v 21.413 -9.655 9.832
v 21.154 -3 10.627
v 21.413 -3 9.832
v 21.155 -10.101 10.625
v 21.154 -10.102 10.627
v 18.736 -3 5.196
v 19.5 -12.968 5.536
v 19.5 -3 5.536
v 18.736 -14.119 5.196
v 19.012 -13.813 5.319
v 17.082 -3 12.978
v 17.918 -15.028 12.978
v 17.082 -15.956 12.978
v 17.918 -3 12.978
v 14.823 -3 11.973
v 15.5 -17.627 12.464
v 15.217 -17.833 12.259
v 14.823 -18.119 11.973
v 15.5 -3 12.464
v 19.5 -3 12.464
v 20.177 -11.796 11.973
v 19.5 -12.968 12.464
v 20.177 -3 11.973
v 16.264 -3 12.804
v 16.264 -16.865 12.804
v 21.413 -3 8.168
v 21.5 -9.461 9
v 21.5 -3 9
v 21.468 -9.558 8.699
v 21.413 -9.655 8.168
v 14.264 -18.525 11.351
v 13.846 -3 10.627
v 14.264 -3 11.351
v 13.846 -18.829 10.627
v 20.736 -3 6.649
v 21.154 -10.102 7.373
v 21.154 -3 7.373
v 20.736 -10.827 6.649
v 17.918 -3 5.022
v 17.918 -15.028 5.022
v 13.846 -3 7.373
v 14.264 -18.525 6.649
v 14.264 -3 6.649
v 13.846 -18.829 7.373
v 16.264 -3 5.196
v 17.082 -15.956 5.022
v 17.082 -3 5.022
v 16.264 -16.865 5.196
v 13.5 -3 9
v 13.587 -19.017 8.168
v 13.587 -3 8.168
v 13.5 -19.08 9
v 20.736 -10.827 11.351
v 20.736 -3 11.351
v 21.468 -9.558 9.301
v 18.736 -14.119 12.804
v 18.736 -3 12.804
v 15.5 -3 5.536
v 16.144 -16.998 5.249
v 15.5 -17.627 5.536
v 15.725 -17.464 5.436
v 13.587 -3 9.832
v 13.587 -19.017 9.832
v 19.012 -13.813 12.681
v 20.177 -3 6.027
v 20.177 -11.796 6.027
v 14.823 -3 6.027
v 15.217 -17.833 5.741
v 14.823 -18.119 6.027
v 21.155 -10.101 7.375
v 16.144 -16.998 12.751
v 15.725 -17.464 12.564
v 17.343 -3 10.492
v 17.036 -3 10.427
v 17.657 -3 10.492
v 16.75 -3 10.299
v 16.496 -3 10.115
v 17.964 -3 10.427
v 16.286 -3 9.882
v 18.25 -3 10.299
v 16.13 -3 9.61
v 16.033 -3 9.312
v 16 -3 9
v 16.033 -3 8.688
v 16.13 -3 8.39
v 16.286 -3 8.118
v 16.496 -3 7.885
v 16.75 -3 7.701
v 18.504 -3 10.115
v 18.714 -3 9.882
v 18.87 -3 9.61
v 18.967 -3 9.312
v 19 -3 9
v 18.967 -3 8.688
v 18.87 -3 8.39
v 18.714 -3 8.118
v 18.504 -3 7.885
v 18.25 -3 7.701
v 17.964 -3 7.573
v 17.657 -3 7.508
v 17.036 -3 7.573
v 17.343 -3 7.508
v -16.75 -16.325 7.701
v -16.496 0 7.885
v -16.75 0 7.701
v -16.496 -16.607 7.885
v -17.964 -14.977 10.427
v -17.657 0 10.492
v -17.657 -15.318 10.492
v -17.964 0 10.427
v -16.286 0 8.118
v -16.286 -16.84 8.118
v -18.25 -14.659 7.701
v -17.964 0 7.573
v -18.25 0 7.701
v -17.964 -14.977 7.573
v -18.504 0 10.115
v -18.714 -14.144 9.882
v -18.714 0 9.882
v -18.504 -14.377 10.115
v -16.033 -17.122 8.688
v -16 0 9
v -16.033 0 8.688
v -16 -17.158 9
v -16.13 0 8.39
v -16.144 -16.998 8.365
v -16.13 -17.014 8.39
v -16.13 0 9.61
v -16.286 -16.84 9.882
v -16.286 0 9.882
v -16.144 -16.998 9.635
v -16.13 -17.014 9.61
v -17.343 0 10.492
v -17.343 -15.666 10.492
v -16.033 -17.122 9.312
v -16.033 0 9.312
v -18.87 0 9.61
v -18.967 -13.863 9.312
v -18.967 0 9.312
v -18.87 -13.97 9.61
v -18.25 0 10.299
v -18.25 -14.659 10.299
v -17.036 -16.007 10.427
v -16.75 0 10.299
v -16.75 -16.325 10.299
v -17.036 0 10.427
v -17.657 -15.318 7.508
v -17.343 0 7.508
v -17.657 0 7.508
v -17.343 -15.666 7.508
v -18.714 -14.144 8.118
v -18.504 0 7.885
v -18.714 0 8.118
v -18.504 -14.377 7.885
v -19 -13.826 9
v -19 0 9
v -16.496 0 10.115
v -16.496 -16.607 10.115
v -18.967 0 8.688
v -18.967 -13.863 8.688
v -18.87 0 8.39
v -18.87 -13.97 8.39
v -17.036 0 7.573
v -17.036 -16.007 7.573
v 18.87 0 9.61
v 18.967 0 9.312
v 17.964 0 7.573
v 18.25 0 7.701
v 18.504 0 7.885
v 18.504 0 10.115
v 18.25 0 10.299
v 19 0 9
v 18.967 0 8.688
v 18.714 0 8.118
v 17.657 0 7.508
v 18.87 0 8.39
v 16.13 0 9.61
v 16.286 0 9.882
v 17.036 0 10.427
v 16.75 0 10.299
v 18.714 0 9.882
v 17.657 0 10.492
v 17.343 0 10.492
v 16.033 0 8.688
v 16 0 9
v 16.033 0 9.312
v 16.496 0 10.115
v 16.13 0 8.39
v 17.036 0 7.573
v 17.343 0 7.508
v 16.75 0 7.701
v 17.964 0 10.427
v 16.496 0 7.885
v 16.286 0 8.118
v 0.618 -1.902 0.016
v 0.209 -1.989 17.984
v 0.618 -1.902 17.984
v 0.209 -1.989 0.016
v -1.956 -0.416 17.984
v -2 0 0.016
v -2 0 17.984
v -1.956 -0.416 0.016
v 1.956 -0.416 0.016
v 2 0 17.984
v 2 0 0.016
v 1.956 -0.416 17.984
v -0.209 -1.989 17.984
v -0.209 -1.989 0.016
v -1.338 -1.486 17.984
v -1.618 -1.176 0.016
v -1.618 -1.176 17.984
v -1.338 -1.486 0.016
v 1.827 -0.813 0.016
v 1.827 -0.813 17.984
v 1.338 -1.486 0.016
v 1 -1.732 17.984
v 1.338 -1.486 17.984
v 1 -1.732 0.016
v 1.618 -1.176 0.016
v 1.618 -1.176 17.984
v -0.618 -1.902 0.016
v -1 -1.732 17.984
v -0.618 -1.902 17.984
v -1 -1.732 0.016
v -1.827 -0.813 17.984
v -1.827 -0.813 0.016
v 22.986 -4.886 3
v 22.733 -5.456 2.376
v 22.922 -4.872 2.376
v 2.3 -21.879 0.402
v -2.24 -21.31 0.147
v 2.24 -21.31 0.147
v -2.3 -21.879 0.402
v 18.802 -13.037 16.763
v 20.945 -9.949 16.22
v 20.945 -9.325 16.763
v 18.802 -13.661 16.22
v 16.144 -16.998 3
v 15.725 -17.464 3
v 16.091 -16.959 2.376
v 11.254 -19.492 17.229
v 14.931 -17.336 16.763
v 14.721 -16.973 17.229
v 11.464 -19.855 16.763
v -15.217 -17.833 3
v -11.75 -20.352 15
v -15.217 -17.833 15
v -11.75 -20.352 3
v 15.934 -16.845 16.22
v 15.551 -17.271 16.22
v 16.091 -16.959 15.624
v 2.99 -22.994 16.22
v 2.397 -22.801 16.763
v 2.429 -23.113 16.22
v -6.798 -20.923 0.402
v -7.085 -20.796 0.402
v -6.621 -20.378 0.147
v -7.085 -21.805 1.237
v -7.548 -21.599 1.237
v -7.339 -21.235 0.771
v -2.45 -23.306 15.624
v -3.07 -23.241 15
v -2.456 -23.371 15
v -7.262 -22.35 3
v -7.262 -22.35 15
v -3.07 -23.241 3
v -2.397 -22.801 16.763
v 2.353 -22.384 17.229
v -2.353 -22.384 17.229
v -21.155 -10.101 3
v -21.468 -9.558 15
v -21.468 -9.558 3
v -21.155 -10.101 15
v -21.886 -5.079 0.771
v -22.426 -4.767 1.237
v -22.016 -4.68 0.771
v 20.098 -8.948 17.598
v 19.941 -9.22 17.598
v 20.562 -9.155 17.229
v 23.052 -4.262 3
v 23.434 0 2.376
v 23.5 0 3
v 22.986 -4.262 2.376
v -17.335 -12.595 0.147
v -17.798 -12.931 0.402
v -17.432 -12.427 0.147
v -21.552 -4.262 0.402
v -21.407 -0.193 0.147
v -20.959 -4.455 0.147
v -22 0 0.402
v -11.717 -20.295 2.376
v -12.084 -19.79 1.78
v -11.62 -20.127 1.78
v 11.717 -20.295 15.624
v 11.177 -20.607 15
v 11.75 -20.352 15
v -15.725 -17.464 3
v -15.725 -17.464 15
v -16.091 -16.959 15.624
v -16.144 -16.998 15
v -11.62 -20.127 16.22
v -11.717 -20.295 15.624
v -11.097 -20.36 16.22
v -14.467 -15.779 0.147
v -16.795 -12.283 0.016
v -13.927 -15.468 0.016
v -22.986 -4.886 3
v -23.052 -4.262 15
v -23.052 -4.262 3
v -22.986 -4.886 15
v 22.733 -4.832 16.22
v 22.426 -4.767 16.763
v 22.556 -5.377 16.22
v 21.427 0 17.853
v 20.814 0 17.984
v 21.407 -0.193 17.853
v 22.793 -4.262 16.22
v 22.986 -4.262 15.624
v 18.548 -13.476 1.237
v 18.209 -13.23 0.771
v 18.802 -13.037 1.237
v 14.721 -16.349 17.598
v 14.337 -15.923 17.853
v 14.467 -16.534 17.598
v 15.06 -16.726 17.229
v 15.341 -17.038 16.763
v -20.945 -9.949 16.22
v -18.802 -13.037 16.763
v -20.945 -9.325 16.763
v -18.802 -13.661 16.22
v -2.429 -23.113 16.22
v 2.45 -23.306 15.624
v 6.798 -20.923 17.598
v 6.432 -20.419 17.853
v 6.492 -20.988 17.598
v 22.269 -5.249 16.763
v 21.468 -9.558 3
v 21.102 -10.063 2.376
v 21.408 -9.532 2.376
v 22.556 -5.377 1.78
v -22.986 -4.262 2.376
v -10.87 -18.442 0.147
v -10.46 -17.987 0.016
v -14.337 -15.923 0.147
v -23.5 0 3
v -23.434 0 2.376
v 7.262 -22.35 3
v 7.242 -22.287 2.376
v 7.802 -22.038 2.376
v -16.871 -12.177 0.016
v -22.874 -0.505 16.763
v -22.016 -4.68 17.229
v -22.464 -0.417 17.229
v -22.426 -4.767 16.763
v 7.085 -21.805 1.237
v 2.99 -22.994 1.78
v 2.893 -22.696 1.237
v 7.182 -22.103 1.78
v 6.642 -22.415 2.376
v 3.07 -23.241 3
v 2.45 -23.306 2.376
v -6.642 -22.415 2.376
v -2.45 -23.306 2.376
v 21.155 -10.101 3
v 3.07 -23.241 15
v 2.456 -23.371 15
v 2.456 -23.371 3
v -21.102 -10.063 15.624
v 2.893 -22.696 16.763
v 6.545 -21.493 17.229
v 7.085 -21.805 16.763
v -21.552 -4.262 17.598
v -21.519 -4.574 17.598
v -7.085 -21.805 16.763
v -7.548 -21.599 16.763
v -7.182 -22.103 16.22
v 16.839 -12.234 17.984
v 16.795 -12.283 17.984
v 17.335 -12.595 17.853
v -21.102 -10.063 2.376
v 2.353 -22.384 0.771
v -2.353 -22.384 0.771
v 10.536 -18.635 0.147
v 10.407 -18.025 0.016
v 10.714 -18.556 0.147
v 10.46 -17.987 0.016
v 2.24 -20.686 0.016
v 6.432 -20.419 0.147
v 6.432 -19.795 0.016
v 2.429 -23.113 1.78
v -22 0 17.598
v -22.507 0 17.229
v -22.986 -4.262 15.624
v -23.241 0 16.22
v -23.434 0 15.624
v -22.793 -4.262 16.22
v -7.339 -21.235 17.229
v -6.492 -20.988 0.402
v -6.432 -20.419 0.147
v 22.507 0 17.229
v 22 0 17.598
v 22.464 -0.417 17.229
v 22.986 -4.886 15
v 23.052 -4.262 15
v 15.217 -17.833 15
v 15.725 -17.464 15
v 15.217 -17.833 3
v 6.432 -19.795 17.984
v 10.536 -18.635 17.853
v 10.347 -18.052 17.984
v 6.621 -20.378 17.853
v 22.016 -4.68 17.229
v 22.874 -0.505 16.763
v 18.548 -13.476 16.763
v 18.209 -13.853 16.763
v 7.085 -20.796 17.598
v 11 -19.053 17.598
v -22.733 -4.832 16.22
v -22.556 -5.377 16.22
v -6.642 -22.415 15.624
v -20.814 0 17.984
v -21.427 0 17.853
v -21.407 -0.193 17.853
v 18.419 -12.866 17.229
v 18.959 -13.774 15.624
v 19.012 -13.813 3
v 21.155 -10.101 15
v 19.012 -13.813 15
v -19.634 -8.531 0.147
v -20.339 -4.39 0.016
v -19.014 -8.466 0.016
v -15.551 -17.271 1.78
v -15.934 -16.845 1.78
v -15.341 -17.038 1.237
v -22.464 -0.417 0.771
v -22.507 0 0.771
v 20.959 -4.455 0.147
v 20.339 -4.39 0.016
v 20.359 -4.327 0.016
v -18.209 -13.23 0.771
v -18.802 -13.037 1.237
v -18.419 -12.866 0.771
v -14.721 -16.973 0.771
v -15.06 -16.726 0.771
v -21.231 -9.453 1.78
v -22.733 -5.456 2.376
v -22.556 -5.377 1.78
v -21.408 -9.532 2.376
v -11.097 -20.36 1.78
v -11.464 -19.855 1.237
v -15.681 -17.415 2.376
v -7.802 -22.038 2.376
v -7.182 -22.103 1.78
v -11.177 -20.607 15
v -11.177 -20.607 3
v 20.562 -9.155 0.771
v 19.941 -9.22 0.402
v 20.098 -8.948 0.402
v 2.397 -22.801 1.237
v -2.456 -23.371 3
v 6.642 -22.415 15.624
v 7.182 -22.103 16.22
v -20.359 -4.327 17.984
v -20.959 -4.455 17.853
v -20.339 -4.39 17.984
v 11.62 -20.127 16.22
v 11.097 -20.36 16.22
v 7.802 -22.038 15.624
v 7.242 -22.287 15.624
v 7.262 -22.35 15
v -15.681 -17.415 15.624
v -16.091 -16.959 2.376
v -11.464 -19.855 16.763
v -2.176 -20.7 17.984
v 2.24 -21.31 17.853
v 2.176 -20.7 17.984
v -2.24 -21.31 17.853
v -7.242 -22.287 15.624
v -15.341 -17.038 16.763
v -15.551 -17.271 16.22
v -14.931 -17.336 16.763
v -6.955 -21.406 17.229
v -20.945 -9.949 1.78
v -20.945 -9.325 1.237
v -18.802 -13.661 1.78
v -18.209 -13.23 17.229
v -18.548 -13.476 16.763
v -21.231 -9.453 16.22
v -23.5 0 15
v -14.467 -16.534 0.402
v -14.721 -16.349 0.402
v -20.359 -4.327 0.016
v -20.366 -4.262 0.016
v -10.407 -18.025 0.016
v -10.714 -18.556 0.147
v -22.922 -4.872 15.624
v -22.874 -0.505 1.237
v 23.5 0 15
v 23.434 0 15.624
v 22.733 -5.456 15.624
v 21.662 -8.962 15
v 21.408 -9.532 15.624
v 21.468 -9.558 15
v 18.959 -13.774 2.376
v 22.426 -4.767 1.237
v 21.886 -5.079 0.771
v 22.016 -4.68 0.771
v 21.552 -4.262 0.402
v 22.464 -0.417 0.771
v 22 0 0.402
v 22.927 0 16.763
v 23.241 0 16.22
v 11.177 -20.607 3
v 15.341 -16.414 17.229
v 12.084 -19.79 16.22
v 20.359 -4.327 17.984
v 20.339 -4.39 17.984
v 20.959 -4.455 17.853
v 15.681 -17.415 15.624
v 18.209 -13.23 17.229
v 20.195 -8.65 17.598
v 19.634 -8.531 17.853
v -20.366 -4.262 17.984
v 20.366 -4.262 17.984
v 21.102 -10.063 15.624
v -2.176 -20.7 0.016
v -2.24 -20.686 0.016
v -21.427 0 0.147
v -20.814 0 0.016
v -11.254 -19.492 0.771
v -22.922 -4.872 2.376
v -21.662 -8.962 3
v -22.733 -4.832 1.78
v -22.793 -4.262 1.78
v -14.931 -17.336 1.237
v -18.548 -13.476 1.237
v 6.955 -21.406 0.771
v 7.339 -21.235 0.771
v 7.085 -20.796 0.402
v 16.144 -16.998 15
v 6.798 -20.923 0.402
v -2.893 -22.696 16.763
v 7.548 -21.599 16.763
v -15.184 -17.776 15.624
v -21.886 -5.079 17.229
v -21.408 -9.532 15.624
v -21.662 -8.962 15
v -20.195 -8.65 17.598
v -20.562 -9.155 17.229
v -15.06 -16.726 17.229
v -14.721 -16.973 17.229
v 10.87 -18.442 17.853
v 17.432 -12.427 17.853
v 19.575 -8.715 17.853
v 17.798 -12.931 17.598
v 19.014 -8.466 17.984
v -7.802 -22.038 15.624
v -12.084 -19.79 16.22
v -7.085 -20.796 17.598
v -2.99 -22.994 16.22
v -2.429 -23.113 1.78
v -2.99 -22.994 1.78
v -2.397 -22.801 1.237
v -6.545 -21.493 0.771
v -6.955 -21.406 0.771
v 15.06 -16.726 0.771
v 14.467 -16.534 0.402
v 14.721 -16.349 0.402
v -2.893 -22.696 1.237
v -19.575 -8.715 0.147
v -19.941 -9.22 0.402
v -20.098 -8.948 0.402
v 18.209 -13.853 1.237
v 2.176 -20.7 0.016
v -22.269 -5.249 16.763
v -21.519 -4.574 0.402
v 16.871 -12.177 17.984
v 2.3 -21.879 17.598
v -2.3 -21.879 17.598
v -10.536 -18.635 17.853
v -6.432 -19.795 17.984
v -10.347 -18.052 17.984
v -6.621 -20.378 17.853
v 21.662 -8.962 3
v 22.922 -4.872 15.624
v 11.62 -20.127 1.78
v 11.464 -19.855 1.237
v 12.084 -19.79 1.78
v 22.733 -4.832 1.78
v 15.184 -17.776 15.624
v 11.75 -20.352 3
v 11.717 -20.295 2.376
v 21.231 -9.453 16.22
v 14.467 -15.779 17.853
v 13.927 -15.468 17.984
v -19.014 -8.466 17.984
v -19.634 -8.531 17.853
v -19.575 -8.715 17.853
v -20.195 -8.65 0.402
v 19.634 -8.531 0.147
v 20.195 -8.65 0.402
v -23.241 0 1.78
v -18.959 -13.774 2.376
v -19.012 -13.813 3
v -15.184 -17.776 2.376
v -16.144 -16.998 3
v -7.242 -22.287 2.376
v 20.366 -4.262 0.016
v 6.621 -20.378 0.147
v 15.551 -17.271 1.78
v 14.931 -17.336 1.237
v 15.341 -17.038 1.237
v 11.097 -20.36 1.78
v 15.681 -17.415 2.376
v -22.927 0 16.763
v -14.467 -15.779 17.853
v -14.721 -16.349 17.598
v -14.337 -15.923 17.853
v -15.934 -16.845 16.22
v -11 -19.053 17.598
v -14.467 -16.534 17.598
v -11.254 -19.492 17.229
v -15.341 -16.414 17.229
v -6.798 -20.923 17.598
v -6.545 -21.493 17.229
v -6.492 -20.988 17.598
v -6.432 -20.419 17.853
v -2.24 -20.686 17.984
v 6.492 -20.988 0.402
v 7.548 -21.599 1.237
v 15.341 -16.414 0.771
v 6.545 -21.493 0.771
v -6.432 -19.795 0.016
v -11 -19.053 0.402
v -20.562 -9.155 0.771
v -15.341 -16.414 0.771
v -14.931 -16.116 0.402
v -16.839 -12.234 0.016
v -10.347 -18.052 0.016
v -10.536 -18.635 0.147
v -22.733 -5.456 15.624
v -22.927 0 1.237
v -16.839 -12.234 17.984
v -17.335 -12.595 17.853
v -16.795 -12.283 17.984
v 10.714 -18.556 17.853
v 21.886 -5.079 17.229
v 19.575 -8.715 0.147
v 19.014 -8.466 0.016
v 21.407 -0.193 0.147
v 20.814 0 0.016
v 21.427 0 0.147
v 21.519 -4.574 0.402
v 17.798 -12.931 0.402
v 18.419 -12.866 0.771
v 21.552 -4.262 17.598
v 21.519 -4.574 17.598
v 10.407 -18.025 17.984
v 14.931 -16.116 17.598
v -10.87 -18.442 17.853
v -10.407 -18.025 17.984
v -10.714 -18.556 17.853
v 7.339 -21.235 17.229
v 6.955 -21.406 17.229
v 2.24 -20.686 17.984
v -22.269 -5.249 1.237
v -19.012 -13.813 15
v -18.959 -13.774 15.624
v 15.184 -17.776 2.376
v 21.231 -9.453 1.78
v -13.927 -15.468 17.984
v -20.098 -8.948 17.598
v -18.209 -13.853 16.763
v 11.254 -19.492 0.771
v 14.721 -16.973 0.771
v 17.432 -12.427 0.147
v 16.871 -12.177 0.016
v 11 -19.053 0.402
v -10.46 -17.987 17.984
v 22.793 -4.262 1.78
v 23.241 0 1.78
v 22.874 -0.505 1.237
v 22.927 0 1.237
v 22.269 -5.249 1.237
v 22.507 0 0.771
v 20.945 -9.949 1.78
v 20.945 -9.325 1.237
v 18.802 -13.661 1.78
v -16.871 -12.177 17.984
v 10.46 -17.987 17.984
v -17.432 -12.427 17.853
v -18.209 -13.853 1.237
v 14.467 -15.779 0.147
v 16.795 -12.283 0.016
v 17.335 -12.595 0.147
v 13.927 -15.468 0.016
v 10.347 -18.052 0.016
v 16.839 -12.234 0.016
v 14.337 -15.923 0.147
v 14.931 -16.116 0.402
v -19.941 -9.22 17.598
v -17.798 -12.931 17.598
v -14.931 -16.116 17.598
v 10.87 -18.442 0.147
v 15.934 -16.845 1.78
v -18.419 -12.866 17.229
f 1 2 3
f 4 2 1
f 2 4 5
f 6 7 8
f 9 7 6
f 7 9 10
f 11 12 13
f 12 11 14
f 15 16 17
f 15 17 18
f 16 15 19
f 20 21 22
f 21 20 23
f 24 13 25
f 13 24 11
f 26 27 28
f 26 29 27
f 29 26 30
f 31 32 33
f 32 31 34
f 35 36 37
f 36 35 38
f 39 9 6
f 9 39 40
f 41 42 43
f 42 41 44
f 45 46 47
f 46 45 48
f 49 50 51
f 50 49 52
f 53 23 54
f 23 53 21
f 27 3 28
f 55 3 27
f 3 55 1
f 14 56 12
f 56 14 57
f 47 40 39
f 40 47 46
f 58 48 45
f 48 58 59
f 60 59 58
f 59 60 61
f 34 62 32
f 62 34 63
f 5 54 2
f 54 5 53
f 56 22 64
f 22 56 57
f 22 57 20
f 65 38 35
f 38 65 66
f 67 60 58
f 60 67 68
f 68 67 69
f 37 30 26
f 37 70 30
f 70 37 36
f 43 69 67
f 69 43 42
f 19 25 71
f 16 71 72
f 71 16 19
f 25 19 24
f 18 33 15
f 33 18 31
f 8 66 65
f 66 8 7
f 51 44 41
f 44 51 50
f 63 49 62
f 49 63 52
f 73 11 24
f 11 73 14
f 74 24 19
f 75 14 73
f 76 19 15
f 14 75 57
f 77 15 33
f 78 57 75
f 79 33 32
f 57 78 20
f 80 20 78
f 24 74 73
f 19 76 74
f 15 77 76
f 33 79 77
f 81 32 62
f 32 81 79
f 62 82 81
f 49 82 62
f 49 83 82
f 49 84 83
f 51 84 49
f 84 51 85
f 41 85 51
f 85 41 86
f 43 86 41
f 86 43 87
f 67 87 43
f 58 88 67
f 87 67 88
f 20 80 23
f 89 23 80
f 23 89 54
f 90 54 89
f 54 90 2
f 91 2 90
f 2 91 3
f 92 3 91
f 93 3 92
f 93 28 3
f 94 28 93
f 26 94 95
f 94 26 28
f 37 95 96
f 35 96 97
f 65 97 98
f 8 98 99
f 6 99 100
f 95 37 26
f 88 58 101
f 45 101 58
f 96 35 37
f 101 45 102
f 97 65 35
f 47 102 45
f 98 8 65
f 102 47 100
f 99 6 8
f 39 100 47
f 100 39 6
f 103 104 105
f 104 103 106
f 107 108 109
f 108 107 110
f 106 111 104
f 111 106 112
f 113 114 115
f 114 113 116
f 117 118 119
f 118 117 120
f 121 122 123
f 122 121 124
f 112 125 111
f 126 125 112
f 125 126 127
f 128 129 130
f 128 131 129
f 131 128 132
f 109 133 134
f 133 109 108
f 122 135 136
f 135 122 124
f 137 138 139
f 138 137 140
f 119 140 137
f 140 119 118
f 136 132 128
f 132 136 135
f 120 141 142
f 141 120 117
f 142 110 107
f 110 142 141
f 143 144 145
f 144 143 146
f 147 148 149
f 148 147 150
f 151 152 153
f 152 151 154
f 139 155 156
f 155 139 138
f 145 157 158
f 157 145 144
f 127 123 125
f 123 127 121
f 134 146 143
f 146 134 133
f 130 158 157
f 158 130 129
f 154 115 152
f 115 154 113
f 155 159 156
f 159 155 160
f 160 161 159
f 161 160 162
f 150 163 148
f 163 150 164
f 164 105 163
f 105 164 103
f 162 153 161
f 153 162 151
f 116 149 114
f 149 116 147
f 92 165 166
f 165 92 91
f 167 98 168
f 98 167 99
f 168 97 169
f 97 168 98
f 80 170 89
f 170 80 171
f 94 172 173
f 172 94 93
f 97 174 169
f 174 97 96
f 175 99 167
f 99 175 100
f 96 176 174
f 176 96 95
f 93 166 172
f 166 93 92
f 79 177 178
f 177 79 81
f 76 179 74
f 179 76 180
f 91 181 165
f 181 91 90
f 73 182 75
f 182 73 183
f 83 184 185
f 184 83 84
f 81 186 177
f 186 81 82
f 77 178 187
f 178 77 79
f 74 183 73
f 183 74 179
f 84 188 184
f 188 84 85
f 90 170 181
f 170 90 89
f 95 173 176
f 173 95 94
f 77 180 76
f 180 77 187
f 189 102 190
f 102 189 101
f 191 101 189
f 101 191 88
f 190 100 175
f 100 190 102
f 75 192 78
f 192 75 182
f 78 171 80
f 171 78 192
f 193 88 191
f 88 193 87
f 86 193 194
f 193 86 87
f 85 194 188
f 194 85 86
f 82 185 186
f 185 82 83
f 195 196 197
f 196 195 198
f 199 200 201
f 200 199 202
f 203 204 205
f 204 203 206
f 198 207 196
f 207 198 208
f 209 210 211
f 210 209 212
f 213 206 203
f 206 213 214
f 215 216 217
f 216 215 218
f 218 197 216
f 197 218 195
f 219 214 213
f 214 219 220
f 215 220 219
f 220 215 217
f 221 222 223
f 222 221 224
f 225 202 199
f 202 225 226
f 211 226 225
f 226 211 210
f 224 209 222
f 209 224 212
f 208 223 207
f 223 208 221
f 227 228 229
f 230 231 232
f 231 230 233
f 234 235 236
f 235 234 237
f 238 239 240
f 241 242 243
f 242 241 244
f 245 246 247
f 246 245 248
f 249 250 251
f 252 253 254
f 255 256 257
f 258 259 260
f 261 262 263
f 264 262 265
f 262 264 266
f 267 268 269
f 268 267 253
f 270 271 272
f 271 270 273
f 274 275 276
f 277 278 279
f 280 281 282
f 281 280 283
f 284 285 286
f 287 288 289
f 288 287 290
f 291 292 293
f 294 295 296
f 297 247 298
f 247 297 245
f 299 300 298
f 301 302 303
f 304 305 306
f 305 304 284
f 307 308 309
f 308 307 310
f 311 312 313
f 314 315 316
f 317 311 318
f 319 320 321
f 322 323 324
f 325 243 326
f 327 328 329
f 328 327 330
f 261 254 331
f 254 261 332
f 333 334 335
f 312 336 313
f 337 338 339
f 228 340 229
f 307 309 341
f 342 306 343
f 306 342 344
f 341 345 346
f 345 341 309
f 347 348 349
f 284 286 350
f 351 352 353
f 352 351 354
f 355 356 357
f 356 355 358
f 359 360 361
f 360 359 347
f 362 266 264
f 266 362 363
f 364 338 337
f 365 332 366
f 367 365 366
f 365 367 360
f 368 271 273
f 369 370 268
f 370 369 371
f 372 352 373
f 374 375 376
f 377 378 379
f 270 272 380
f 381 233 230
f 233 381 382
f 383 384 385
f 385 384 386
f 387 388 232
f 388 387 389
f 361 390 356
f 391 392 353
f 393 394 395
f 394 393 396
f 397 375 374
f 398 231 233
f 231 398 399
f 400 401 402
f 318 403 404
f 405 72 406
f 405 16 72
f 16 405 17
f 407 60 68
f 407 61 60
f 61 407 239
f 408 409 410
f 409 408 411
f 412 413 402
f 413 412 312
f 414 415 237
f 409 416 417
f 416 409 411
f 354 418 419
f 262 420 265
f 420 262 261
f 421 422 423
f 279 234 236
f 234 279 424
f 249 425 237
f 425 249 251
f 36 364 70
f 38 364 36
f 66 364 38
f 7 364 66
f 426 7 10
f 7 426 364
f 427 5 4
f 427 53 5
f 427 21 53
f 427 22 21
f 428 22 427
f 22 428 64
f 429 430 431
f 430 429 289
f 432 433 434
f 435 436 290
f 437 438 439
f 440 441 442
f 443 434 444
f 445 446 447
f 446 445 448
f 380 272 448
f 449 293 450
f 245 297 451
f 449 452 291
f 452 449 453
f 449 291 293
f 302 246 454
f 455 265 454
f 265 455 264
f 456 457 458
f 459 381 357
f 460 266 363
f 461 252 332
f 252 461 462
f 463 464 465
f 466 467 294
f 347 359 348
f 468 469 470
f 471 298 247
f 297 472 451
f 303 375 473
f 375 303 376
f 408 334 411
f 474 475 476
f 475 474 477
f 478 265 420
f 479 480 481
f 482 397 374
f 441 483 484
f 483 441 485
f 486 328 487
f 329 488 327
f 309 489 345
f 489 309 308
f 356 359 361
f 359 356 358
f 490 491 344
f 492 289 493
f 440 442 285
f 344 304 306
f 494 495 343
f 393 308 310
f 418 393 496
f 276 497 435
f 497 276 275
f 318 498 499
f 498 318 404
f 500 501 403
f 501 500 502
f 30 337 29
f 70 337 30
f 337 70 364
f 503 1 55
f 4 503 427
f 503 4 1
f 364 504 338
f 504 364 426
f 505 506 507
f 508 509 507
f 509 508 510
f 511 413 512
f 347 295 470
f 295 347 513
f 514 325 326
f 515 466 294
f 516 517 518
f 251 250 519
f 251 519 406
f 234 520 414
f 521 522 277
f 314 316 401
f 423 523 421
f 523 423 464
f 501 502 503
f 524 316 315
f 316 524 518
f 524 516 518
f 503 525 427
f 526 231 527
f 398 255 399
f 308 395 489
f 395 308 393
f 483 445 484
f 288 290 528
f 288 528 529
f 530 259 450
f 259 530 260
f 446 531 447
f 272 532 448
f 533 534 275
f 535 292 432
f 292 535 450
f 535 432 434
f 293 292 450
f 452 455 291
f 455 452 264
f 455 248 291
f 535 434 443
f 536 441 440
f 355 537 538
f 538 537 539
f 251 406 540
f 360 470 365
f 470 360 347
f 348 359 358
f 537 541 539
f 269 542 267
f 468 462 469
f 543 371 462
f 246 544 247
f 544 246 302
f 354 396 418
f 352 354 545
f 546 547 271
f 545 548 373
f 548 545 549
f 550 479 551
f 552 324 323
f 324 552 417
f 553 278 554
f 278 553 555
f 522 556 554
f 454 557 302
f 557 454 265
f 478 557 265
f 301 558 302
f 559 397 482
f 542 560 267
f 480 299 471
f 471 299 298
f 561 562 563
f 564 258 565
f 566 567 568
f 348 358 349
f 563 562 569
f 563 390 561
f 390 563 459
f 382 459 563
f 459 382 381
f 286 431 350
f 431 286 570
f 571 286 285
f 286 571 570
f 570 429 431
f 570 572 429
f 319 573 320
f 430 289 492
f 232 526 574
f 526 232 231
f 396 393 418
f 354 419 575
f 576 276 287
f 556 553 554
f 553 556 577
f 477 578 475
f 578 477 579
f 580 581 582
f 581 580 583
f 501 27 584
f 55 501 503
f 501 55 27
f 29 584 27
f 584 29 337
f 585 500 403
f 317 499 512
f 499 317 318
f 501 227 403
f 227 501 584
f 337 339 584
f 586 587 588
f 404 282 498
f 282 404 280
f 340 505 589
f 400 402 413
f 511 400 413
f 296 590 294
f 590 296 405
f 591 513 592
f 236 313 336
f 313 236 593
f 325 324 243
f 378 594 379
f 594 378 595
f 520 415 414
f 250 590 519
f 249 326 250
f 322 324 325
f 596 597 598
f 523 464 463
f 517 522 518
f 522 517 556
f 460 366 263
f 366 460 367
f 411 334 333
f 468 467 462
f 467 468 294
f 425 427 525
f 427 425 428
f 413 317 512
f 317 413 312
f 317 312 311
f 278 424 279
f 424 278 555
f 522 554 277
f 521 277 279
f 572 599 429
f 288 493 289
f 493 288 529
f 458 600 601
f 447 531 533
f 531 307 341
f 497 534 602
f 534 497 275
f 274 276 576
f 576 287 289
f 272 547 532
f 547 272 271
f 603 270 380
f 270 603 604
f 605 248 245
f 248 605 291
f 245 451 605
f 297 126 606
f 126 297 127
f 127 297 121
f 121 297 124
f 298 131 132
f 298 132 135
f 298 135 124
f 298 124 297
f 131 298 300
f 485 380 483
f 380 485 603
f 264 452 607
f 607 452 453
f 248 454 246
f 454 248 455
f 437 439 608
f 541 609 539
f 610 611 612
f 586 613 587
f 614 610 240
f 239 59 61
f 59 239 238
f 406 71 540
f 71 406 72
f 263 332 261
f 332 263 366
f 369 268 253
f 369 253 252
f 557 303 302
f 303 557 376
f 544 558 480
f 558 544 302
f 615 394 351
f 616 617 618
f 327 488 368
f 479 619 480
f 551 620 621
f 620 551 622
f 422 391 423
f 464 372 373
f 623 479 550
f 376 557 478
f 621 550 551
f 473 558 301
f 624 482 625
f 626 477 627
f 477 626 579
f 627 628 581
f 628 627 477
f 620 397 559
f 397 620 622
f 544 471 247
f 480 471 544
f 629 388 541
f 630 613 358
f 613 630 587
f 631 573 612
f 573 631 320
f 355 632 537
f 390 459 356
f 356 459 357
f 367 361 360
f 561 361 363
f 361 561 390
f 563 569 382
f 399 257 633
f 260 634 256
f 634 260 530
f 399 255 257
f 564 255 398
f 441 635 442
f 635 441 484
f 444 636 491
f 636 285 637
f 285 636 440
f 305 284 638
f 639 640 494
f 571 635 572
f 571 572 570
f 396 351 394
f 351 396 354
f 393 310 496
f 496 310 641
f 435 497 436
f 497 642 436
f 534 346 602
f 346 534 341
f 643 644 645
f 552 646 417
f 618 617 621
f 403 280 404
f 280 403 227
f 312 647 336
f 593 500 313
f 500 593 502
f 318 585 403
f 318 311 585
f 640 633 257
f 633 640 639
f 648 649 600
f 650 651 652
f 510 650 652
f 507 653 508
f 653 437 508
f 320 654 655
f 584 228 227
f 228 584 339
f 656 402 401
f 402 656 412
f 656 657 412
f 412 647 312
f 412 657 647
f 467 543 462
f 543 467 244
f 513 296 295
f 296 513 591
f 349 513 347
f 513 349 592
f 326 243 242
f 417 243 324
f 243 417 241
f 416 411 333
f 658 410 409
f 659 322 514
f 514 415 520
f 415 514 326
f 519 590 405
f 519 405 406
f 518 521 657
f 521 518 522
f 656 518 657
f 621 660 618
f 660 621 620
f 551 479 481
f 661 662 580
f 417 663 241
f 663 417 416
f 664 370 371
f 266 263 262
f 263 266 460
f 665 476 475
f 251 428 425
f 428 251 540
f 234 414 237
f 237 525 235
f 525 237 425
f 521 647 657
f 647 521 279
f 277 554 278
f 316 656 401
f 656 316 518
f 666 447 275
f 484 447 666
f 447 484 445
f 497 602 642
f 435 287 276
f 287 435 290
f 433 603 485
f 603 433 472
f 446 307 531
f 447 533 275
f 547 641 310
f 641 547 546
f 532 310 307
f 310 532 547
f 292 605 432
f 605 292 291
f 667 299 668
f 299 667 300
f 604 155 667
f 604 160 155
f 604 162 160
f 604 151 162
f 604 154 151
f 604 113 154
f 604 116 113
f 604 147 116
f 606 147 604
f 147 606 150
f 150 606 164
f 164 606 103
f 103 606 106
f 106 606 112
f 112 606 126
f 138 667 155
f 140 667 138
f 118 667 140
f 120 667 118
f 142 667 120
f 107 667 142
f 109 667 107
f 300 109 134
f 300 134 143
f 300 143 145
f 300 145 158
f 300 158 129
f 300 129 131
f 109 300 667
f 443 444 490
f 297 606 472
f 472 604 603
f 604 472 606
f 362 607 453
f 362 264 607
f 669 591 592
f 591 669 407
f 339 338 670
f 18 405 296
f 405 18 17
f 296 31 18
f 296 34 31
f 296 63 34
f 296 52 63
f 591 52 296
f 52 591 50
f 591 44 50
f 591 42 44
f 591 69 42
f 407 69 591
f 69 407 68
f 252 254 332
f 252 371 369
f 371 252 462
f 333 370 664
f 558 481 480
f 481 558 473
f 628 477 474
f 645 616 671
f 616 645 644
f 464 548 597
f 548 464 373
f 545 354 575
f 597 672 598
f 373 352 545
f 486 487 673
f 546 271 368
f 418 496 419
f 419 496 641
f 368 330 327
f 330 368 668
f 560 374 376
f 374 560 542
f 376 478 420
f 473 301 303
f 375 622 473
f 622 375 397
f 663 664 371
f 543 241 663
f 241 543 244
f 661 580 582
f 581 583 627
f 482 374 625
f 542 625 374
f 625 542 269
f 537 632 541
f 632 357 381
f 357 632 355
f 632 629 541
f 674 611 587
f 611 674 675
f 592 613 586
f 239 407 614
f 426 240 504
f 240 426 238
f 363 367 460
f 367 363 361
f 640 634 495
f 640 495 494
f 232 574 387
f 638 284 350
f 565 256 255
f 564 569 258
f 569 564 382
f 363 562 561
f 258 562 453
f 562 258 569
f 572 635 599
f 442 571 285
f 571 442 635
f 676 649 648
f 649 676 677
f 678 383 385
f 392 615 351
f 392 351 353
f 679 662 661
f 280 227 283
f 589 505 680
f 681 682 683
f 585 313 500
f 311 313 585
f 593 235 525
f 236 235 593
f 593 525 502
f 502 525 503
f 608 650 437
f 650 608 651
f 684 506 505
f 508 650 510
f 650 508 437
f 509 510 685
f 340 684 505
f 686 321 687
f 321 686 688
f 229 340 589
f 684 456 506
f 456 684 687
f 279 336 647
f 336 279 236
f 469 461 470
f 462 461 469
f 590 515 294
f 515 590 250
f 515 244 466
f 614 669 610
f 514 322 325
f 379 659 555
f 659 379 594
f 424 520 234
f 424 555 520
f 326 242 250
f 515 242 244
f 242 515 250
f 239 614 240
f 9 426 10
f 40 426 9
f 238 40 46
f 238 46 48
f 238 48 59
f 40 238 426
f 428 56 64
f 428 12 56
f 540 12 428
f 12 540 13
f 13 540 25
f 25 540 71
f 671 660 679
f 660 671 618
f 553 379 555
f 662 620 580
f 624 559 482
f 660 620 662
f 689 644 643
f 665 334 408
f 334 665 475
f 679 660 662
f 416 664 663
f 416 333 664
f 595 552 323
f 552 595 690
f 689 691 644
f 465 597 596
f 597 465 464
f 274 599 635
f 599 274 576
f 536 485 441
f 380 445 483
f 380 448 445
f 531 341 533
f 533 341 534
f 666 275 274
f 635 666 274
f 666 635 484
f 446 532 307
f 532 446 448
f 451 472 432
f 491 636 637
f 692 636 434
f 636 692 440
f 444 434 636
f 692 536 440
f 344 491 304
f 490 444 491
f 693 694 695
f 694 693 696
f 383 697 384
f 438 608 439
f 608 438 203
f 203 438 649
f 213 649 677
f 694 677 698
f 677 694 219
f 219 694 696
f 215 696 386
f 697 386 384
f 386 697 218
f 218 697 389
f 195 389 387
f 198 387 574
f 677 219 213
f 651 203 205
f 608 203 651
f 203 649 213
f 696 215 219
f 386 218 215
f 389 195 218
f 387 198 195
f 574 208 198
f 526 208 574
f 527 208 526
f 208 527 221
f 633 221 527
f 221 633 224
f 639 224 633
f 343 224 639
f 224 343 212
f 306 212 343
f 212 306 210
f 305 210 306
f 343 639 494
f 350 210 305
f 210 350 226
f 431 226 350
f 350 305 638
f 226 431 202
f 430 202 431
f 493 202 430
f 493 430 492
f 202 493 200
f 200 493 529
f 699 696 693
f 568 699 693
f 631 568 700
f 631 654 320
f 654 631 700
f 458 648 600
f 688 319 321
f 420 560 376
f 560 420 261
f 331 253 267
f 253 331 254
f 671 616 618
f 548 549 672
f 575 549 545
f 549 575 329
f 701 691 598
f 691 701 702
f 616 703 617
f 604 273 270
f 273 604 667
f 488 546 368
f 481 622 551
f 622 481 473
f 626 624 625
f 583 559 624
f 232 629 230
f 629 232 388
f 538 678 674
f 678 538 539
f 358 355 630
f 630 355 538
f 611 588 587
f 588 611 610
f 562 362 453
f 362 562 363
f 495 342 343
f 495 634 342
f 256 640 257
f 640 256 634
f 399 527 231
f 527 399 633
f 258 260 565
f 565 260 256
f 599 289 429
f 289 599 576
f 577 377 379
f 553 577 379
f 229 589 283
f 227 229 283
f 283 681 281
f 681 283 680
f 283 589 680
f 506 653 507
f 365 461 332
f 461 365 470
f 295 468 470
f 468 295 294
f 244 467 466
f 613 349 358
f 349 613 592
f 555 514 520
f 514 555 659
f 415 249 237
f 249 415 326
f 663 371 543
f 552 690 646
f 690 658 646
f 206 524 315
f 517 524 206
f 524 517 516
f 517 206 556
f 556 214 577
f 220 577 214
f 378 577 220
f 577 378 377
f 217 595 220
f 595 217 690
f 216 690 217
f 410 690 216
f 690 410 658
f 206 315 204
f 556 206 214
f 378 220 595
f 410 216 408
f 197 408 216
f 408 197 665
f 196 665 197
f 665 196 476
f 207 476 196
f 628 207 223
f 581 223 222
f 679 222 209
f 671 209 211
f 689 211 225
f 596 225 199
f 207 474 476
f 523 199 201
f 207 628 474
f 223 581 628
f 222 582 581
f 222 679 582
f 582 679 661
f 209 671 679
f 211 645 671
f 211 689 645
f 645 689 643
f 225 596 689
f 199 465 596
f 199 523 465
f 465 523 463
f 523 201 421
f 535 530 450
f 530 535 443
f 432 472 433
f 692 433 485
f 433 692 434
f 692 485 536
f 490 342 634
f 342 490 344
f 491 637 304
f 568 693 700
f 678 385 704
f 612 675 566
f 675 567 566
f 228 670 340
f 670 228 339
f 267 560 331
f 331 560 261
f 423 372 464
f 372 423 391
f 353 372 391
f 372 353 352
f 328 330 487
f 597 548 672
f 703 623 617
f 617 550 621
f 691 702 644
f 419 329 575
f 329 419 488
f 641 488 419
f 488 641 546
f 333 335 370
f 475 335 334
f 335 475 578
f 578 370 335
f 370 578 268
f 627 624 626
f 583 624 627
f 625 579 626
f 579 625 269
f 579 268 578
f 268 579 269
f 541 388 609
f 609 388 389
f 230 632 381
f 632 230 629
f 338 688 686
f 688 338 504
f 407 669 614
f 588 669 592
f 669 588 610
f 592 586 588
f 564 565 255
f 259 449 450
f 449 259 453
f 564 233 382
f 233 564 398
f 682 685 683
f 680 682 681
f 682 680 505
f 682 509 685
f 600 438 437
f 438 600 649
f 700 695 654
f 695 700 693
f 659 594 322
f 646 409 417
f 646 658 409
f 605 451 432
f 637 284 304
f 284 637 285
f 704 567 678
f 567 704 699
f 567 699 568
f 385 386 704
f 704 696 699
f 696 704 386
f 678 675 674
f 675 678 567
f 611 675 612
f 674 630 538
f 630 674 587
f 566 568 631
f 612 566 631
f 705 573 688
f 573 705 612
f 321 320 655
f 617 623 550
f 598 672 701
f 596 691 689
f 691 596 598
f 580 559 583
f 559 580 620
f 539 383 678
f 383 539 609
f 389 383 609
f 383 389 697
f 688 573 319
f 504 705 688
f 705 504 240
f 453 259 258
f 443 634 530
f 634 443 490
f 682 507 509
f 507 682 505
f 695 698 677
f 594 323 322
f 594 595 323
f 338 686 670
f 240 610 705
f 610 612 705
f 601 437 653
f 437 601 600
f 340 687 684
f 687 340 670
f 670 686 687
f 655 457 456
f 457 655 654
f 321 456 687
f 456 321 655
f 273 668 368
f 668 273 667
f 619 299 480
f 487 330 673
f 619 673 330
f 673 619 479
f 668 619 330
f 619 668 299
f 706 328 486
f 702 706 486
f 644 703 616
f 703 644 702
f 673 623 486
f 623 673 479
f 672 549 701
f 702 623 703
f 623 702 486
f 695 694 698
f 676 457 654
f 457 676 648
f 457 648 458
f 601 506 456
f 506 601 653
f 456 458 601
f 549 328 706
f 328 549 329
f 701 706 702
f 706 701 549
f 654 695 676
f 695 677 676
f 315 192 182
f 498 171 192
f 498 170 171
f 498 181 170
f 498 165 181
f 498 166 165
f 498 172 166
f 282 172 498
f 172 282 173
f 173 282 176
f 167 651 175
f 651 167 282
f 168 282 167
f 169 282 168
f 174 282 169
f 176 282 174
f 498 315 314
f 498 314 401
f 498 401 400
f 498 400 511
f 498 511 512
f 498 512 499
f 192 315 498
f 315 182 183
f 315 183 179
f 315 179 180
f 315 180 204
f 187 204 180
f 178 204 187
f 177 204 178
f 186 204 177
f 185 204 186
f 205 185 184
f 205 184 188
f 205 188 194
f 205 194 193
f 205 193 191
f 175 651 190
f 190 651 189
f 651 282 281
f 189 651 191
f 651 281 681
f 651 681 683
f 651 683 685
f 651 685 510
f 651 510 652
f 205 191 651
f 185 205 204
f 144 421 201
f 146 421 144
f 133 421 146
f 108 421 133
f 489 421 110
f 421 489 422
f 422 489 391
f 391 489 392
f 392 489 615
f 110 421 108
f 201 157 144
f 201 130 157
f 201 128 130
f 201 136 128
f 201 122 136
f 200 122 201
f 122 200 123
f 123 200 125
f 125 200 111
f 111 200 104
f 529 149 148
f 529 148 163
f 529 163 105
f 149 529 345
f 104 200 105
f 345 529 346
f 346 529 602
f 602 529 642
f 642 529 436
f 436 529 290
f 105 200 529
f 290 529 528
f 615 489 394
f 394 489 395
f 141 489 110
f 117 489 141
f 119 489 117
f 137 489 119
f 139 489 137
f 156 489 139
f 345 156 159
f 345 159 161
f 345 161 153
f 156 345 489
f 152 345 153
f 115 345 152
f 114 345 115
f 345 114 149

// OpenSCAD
wheelWidth = 18;
wheelHoleSize = 4;
wheelOuter = 47;

screwOffsetFromEdge = wheelWidth / 3;

$fn = 30;


module fullWheel() {
    difference() {
        union() {
            translate([0,0,3]) {
                minkowski() {
                    cylinder(d=wheelOuter-6, h=wheelWidth-6 );
                    sphere(r=3);
                }
            }
        }
        union() {
            cylinder(d=wheelHoleSize, h=wheelWidth );
            
            // Add a M3 hole all the way through either side of the middle.
            
            rotate([90,0,0]) {
                // Screw head hollow out.
                translate([(wheelOuter/2 -screwOffsetFromEdge), wheelWidth/2, 3]) {
                    #cylinder(d=8, h= 25 );
                }
                
                // Through holes.
                translate([-(wheelOuter/2 -screwOffsetFromEdge), wheelWidth/2, -wheelOuter/2]) {
                    #cylinder(d=3, h=wheelOuter +10 );
                }
                
                translate([(wheelOuter/2 -screwOffsetFromEdge), wheelWidth/2, -wheelOuter/2]) {
                    #cylinder(d=3, h=wheelOuter +10 );
                }
            }
            translate([-(wheelOuter +10), 0, 0]) {
            }
        }
    }
}

difference() {
    union() {
        fullWheel();
    }
    union() {
        // Chop off half the wheel 
        translate([-(wheelOuter/2), 0, 0]) {
            cube([wheelOuter, wheelOuter, wheelWidth]);
        }
    }
}
